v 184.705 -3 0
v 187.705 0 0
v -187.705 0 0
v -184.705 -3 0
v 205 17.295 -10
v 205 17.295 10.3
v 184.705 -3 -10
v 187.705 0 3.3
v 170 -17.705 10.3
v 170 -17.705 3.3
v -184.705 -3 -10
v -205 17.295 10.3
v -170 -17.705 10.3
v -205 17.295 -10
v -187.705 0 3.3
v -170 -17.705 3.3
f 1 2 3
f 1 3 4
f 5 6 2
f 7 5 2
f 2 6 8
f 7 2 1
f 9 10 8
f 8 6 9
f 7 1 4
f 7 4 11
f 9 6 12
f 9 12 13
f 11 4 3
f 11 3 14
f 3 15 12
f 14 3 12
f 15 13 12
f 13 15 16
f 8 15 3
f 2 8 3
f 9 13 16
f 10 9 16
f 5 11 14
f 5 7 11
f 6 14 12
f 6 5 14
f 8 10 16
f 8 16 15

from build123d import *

# Parameters (mm, degrees)
F1_DEPTH = 205
F3_DEPTH = 25.4


with BuildPart() as f1:
    # F0 (on Right) → F1 (new body, symmetric)
    with BuildSketch(Plane.YZ):
        Polygon((17.2946, -10), (17.2946, 10.3), (-17.7054, 10.3), (-17.7054, 3.3), (0, 3.3), (0, 0), (-3, 0), (-3, -10), align=None)
    extrude(amount=F1_DEPTH, both=True)

    # F2 (on face) → F3 (cut)
    with BuildSketch(Plane.XY.offset(10.3)):
        Polygon((-170, -17.7054), (-205, 17.2946), (-205, -17.7054), align=None)
        Polygon((205, -17.7054), (205, 17.2946), (170, -17.7054), align=None)
    extrude(amount=-F3_DEPTH, mode=Mode.SUBTRACT)


solid = f1.part
